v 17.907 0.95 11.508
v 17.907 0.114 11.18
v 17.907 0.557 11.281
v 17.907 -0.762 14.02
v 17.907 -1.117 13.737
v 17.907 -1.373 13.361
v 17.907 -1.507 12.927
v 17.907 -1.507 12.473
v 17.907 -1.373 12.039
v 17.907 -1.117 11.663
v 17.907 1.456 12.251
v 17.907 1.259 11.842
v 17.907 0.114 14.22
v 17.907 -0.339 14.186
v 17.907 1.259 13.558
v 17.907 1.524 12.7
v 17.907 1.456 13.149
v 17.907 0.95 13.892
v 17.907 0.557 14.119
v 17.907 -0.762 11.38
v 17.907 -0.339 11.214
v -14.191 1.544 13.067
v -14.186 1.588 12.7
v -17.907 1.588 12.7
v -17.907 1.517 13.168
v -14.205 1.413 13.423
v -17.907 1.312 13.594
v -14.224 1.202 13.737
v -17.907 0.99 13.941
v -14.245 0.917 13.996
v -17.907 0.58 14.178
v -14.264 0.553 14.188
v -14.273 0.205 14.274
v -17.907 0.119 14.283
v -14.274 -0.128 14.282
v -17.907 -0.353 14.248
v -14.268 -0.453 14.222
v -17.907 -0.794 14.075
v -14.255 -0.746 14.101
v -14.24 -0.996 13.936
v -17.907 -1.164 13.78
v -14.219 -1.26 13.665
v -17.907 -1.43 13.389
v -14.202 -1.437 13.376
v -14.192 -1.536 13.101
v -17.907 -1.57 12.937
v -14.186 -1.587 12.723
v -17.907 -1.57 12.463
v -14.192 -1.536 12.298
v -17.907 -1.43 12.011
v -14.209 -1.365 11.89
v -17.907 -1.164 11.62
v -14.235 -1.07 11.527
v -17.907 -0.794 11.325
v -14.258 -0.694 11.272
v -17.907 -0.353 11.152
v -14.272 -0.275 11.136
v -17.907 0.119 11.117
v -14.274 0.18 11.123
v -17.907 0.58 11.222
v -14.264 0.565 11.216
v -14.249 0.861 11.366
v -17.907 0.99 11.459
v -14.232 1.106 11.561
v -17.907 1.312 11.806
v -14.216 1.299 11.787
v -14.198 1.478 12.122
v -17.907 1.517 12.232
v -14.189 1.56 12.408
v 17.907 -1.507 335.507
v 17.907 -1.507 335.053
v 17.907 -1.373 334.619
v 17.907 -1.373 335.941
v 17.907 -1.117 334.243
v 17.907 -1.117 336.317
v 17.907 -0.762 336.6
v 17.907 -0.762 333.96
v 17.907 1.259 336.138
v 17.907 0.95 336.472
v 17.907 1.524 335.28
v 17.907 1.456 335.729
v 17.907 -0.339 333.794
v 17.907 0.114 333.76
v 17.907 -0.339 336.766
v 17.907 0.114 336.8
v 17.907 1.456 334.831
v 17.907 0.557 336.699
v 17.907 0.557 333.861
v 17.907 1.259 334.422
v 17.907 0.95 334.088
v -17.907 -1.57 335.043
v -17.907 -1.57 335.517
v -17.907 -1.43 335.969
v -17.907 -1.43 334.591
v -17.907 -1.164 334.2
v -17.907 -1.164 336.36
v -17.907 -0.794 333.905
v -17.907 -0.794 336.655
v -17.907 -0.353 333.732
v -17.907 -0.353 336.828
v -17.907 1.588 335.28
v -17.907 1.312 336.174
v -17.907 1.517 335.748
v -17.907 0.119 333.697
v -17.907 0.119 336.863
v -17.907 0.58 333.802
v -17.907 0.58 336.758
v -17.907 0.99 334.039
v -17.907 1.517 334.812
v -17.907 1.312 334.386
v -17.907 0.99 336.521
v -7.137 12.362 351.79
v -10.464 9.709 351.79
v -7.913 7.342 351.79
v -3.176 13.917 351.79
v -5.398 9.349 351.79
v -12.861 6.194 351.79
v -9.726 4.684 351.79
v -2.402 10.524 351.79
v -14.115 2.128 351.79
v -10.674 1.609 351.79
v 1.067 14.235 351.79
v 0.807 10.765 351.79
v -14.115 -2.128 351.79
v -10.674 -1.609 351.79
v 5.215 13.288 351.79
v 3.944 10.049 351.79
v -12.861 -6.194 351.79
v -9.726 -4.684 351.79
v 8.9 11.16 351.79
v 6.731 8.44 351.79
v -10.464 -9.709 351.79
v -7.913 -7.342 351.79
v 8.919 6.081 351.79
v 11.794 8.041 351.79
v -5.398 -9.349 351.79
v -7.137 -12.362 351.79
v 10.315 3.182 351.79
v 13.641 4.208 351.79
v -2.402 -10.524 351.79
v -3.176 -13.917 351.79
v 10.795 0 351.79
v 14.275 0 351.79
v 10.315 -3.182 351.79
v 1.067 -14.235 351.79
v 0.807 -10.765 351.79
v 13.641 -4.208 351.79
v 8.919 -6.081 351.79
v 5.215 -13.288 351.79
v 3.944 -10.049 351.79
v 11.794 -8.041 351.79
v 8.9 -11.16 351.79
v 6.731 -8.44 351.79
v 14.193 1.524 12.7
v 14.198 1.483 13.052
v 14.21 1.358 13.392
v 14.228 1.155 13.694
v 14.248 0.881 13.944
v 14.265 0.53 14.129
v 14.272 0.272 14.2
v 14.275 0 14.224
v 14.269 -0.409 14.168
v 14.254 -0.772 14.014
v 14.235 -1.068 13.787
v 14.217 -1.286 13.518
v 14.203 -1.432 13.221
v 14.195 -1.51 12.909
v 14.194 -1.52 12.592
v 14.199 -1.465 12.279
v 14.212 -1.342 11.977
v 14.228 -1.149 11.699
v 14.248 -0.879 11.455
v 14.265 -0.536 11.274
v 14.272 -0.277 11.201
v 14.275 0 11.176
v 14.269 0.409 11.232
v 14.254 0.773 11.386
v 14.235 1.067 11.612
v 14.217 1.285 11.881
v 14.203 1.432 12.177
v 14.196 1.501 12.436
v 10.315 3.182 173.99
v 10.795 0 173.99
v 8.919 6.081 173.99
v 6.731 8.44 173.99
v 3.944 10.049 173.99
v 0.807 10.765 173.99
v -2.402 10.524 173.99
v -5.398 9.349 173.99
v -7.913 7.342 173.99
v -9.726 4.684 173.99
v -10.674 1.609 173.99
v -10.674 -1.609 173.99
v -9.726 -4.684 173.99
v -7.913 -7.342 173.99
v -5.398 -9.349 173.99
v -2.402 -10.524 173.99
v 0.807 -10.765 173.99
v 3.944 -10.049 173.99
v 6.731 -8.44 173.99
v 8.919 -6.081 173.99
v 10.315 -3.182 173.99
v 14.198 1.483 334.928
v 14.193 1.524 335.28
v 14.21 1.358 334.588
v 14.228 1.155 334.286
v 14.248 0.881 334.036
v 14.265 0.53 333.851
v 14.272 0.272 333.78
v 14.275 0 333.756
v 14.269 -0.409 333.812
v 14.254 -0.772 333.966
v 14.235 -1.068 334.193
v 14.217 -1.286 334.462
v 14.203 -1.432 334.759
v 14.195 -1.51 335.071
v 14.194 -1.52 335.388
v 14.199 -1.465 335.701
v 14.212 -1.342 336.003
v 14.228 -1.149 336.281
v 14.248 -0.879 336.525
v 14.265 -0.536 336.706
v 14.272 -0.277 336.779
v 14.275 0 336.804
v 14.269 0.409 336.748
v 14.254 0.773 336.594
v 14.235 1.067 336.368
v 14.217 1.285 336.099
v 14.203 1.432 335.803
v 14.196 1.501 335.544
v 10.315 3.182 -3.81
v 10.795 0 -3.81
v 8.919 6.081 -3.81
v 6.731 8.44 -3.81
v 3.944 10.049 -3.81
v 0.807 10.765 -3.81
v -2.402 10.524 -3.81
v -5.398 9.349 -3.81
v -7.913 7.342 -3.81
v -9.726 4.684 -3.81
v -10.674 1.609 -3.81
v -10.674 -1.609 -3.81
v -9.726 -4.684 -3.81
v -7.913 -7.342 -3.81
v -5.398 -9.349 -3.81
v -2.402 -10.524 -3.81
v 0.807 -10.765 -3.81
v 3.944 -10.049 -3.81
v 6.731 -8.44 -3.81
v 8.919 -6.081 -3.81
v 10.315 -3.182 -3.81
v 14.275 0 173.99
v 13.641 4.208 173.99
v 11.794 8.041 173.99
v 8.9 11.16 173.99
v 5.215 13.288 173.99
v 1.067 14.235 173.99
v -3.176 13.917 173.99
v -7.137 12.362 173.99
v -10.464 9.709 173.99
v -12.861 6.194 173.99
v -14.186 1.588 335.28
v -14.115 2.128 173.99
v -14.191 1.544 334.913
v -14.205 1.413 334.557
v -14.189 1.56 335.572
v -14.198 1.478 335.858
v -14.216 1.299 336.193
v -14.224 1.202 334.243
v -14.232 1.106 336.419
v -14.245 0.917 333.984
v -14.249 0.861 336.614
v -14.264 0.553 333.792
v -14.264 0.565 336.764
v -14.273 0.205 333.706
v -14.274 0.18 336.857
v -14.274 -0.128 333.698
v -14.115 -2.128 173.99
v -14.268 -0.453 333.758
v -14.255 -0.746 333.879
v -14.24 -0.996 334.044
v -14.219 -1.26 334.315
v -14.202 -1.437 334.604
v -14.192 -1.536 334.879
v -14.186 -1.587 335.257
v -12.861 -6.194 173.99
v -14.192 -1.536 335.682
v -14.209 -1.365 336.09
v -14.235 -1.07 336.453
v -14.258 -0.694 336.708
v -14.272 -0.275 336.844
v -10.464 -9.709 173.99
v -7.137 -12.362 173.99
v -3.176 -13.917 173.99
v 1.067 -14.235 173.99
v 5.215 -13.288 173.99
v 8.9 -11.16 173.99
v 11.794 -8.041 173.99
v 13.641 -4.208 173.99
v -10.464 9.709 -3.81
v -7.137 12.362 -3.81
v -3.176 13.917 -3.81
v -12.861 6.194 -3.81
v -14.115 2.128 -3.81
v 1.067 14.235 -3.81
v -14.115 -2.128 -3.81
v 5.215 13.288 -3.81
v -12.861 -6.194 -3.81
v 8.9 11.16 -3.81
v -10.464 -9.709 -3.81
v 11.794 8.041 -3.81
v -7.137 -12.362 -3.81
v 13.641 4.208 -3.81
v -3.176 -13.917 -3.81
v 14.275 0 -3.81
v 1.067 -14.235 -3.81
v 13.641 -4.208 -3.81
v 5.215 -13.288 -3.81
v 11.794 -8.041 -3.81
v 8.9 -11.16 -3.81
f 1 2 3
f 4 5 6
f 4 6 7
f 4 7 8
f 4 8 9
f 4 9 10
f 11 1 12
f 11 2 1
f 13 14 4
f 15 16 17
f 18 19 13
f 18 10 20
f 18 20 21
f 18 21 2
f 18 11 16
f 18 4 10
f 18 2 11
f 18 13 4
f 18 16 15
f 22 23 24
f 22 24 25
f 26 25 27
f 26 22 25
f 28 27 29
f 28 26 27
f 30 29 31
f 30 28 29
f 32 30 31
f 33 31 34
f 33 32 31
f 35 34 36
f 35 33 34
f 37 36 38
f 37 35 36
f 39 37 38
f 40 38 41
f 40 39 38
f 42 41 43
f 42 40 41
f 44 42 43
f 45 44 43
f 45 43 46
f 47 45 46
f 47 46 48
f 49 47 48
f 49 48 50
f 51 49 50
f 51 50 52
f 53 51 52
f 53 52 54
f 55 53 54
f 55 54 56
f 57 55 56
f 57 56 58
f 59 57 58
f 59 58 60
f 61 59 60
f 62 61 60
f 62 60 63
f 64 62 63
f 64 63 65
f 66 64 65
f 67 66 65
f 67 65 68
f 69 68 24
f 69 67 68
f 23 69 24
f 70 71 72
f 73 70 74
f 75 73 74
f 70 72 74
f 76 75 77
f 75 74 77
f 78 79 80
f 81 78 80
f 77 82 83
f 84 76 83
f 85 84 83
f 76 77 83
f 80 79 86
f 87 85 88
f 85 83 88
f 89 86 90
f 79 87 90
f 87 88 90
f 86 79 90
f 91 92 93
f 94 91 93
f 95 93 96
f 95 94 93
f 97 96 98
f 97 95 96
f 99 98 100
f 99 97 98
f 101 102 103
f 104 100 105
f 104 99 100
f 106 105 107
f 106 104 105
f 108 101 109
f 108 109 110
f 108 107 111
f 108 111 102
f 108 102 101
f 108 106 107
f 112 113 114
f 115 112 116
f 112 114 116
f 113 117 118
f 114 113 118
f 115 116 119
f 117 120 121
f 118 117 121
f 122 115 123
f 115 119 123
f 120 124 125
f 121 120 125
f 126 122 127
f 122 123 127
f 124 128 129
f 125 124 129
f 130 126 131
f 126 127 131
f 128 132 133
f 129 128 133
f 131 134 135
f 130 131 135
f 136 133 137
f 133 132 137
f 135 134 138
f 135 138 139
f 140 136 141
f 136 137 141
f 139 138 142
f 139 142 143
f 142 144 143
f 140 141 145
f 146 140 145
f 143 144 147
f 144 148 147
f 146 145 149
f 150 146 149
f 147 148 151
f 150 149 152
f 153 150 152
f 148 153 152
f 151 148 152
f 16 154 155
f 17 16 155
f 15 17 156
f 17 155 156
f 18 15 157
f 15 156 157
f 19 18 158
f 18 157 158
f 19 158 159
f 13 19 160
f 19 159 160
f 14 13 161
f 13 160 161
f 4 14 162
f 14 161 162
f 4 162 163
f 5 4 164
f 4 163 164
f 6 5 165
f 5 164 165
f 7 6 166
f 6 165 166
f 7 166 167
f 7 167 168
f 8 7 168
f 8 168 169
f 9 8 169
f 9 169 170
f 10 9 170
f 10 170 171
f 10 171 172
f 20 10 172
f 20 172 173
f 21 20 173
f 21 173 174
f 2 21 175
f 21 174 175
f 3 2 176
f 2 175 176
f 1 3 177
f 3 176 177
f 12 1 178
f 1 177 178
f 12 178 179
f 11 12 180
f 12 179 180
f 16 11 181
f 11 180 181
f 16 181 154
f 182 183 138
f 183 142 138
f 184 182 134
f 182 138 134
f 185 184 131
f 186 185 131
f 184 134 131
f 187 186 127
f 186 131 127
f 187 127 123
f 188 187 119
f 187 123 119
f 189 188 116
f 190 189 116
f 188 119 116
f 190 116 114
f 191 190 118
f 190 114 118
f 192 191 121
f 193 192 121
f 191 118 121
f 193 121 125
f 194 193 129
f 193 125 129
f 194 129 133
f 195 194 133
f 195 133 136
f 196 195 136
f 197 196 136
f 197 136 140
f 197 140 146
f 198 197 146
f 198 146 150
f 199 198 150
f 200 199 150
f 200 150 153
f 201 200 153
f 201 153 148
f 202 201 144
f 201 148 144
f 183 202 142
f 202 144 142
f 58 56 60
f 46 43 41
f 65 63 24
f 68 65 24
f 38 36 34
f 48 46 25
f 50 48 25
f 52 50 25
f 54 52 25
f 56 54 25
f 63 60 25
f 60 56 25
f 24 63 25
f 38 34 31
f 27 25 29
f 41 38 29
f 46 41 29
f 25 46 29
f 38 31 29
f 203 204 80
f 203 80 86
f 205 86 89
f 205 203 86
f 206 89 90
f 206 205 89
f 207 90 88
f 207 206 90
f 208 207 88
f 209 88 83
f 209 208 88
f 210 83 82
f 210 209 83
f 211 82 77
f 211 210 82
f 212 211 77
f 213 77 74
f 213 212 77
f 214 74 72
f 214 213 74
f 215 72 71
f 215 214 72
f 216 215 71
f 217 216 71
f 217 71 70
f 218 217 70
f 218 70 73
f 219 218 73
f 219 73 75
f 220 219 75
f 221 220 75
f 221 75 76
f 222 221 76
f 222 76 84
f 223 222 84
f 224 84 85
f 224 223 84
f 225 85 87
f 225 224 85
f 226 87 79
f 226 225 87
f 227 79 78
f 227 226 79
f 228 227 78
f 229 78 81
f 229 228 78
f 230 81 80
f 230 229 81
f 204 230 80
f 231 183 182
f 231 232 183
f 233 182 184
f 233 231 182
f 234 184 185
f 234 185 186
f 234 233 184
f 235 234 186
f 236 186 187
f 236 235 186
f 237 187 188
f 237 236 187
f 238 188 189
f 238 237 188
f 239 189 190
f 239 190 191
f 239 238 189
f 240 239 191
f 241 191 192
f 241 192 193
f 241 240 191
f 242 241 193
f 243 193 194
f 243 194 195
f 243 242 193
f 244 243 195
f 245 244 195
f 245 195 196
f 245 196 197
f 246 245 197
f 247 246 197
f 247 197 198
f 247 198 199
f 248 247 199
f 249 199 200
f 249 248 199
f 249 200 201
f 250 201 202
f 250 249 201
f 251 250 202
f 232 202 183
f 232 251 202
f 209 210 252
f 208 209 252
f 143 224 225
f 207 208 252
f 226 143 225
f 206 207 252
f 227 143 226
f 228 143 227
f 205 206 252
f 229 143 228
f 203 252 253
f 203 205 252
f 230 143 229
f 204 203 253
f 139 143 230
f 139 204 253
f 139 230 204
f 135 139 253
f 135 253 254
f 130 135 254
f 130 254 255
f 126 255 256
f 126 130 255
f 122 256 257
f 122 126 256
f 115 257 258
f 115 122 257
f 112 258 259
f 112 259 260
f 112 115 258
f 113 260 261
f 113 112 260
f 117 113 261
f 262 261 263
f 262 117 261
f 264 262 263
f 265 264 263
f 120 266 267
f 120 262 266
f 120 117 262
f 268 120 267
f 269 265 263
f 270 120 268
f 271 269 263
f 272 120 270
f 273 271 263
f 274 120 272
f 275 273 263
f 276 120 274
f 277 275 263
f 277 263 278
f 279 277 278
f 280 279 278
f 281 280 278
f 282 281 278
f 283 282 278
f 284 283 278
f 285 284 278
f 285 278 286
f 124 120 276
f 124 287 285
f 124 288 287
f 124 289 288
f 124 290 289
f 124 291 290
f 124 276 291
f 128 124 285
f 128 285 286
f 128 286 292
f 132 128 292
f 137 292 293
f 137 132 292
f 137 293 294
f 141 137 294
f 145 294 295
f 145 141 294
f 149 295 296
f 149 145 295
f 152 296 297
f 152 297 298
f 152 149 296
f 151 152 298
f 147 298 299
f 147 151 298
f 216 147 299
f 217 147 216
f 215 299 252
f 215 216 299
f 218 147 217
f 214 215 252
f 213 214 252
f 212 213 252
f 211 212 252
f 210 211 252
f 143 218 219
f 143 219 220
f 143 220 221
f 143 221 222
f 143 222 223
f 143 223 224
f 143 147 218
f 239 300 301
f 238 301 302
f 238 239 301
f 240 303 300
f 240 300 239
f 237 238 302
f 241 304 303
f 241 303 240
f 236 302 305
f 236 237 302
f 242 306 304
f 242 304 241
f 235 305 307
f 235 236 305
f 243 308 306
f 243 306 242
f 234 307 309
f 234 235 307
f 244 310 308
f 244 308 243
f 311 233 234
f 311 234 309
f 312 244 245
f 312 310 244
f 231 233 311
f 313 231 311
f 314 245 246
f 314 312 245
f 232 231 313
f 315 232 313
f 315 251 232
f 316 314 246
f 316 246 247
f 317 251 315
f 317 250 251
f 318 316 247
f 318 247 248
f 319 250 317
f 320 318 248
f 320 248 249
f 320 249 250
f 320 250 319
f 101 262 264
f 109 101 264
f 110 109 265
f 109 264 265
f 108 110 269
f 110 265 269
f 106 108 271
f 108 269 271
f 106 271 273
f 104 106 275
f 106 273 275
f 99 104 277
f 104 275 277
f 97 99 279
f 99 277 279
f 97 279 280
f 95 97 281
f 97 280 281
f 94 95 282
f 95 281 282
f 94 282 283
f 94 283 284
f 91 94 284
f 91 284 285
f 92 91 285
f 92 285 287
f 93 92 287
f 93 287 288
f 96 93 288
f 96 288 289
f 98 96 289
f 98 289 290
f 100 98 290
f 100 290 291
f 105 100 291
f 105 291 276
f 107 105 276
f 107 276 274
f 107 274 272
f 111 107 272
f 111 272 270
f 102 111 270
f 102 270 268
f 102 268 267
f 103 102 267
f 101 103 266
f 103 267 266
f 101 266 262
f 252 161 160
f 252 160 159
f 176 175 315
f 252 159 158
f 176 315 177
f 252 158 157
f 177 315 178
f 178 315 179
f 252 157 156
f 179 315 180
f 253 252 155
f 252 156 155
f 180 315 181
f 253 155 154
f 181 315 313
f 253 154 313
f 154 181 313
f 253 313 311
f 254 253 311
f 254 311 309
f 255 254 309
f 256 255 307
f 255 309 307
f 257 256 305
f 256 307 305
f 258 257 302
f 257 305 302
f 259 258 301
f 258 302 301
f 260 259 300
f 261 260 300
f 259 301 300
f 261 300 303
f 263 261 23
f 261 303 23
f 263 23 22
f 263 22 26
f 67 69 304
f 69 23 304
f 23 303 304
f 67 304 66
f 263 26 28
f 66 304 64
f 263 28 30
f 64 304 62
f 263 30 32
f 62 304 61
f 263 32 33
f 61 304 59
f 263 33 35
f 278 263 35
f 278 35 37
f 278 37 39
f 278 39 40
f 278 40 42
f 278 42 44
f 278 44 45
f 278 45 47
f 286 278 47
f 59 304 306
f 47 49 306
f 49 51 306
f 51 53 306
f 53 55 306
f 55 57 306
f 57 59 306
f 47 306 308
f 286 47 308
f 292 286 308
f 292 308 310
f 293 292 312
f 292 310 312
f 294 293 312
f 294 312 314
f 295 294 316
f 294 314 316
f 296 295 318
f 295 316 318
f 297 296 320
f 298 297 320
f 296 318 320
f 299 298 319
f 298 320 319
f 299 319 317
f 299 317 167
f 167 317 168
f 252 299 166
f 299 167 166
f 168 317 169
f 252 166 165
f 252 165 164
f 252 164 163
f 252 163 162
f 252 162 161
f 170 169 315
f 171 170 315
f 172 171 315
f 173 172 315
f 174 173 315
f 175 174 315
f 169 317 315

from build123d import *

# Parameters (mm, degrees)
F0_R      = 14.2748
F0_R_2    = 12.827
F1_DEPTH  = 266.7
F3_DEPTH  = 12.7
F4_R      = 14.2748
F4_R_2    = 12.827
F5_DEPTH  = 76.2
F7_R      = 1.524
F8_DEPTH  = 5.08
F10_R     = 1.5875
F11_DEPTH = 5.08
F12_R     = 14.2875
F13_DEPTH = 256.54
F14_R     = 14.2748
F14_R_2   = 12.827
F15_DEPTH = 3.81
F16_R     = 14.2748
F16_R_2   = 10.795
F17_DEPTH = 102.87
F18_DEPTH = 74.93


with BuildPart() as f1:
    # F0 (on Top) → F1 (new body)
    with BuildSketch(Plane.XY):
        Circle(F0_R)
        Circle(F0_R_2, mode=Mode.SUBTRACT)
    extrude(amount=F1_DEPTH)

    # F2 (on face) → F3 (join)
    with BuildSketch(Plane.XY.offset(266.7)):
        with BuildLine():
            Line((-3.175, 12.4278438999), (-3.175, 13.9172299701))
            ThreePointArc((-3.175, 13.9172299701), (0, -14.2748), (3.175, 13.9172299701))
            Line((3.175, 13.9172299701), (3.175, 12.4278438999))
            ThreePointArc((3.175, 12.4278438999), (0, -12.827), (-3.175, 12.4278438999))
        make_face()
    extrude(amount=F3_DEPTH)

    # F4 (on face) → F5 (join)
    with BuildSketch(Plane.XY.offset(279.4)):
        Circle(F4_R)
        Circle(F4_R_2, mode=Mode.SUBTRACT)
    extrude(amount=F5_DEPTH)

    # F7 (on offset) → F8 (join)
    with BuildSketch(Plane.YZ.offset(12.827)):
        with Locations((0, 12.7)):
            Circle(F7_R)
    extrude(amount=F8_DEPTH)

    # F10 (on offset) → F11 (join)
    with BuildSketch(Plane.YZ.offset(-12.827)):
        with Locations((0, 12.7)):
            Circle(F10_R)
    extrude(amount=-F11_DEPTH)

    # F12 (on face) → F13 (cut)
    with BuildSketch(Plane.XY.offset(355.6)):
        Circle(F12_R)
    extrude(amount=-F13_DEPTH, mode=Mode.SUBTRACT)

    # F14 (on face) → F15 (join)
    with BuildSketch(Plane(origin=(0, 0, 0), x_dir=(1, 0, 0), z_dir=(0, 0, -1))):
        Circle(F14_R)
        Circle(F14_R_2, mode=Mode.SUBTRACT)
    extrude(amount=F15_DEPTH)

    # F16 (on face) → F17 (join)
    with BuildSketch(Plane.XY.offset(99.06)):
        Circle(F16_R)
        Circle(F16_R_2, mode=Mode.SUBTRACT)
    extrude(amount=-F17_DEPTH)

    # F16 (on face) → F18 (join)
    with BuildSketch(Plane.XY.offset(99.06)):
        Circle(F16_R)
        Circle(F16_R_2, mode=Mode.SUBTRACT)
    extrude(amount=F18_DEPTH)

    # F19: F1 across face


with BuildPart() as f1_1:
    add(f1.part)
    add(f1.part.mirror(Plane.XY.offset(173.99)))


solid = f1_1.part
